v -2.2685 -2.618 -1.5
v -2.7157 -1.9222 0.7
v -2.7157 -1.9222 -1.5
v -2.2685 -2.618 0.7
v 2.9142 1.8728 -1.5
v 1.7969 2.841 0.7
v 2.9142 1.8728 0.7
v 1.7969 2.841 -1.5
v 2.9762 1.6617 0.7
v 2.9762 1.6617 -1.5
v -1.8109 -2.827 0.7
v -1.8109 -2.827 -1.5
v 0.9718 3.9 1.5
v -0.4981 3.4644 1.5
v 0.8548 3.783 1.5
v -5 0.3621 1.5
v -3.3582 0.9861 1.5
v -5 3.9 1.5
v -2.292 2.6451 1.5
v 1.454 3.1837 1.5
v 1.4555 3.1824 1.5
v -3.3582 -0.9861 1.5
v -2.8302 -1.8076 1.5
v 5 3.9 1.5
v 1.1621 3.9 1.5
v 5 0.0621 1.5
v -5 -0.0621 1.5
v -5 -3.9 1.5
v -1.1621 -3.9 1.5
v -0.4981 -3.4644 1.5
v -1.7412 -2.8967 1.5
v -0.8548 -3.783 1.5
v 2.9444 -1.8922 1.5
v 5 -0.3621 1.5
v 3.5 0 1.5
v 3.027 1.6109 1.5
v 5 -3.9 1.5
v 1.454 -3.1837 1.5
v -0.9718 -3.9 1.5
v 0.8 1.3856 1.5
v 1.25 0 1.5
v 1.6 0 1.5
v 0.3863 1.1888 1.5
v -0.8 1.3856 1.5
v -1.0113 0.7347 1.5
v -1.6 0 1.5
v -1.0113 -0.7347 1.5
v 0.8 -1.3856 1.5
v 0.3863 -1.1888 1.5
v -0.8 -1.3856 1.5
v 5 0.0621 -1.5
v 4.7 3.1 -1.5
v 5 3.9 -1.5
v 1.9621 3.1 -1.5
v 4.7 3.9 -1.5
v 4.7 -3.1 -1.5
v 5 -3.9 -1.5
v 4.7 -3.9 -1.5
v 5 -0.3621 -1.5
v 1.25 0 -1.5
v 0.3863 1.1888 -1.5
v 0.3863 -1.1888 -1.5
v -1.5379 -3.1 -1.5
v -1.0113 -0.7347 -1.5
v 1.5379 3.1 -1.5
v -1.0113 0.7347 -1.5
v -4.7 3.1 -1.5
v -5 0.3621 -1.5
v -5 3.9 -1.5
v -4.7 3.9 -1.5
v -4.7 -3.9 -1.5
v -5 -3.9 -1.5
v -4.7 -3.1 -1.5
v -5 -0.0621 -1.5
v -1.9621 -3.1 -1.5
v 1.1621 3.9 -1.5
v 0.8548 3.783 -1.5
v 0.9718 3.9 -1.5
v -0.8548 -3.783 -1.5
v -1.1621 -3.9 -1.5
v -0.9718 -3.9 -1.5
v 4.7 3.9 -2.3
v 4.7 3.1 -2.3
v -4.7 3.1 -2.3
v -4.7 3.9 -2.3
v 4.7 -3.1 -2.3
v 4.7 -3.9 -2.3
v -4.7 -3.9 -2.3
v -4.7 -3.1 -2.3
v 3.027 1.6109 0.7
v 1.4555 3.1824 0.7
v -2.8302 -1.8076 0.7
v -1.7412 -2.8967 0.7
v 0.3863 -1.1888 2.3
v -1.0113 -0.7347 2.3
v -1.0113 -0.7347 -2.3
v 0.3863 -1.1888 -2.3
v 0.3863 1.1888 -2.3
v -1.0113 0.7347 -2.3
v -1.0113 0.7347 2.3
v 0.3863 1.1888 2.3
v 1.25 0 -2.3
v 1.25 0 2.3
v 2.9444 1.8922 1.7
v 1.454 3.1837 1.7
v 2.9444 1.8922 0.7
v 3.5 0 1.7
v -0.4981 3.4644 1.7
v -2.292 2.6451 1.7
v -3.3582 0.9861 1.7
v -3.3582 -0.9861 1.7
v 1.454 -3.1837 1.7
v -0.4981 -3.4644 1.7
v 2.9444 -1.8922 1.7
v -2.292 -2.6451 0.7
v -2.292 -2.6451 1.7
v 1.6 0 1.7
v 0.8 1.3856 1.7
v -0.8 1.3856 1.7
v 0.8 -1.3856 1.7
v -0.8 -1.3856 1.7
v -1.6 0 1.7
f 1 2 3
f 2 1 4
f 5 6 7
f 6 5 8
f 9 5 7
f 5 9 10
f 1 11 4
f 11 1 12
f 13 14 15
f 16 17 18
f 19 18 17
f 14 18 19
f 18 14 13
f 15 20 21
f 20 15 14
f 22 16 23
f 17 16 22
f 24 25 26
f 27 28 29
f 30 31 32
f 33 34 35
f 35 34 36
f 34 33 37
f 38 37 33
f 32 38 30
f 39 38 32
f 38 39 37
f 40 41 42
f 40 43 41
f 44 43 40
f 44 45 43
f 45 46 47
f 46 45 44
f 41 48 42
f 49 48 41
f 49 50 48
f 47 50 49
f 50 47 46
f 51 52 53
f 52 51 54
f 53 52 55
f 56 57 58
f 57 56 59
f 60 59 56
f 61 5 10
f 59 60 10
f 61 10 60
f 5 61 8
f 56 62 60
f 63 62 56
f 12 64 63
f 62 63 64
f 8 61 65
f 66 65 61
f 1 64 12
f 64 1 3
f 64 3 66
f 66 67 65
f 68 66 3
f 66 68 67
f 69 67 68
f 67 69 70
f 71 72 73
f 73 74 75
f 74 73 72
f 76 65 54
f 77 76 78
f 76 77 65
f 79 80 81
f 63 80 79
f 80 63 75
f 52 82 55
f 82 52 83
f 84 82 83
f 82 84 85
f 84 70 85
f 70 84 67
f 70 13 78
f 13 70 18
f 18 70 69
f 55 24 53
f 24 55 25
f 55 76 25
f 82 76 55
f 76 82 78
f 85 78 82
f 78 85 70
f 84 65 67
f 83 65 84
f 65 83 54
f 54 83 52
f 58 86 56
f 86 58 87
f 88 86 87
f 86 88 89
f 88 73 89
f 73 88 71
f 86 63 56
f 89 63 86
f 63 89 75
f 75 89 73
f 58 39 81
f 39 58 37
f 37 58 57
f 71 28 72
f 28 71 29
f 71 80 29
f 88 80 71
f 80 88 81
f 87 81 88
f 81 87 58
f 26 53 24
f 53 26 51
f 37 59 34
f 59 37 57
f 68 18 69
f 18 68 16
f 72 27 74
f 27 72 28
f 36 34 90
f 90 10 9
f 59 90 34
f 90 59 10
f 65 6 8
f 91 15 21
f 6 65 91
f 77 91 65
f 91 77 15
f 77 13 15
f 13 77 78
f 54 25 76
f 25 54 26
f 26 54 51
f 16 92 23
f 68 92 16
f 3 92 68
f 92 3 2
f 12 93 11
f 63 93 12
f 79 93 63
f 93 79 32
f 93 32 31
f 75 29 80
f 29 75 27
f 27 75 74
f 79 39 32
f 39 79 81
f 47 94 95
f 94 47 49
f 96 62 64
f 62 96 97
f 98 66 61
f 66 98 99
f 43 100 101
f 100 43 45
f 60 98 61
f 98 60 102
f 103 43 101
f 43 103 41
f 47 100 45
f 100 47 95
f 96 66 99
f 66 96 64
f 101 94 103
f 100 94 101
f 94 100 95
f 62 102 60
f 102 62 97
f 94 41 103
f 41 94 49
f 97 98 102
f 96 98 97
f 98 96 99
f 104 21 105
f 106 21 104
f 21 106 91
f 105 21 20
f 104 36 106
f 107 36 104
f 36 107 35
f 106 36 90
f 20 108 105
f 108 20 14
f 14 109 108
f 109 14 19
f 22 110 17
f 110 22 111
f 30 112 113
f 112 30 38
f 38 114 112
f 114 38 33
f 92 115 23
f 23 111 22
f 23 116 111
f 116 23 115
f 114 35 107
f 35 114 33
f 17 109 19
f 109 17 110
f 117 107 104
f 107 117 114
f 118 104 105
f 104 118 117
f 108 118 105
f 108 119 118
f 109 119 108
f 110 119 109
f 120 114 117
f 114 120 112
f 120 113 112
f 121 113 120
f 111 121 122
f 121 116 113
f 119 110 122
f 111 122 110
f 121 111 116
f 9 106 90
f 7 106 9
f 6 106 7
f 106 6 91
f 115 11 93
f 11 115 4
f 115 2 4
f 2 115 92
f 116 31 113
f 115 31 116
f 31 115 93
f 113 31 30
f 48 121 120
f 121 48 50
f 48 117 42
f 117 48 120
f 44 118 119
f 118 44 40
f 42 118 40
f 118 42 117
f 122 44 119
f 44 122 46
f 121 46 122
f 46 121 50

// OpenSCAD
// Parameters
thread_diameter = 3.0; //[1.5:6.0:0.1]
thread_pitch = 0.5; //[0.25:1.0:0.05]
across_flats = 6.0; //[3.0:12.0:0.1]
thickness = 3.0; //[1.5:6.0:0.1]
hole_tap_drill_diameter = 2.5; //[1.2:5.0:0.05]
chamfer = 0.3; //[0.1:1.0:0.05]
edge_fillet_radius = 0.2; //[0.0:1.0:0.05]
t_slot_nominal_width = 8.0; //[4.0:16.0:0.1]
t_slot_neck_width = 6.0; //[3.0:12.0:0.1]
t_slot_depth = 6.0; //[3.0:12.0:0.1]
nut_overall_length = 10.0; //[5.0:20.0:0.1]
nut_overall_width = 7.8; //[4.0:16.0:0.1]
retention_feature_height = 0.8; //[0.3:2.0:0.05]
retention_feature_width = 0.8; //[0.3:2.0:0.05]
clearance_to_slot = 0.1; //[0.0:0.5:0.05]
overlap = 0.8; //[0.5:2.0:0.1]
washer_outer_diameter = 7.0; //[4.0:14.0:0.1]
washer_thickness = 1.0; //[0.5:2.5:0.1]
washer_hole_diameter = 3.2; //[2.0:6.5:0.1]

// Nut and Washer - complete geometry
module nut_and_washer() {
  color("DimGray") {
    // Nut Body
    intersection() {
      translate([0, 0, 0])
        cylinder(r=across_flats/(2*cos(30)), h=thickness, center=true);
      translate([0, 0, 0])
        cube([nut_overall_length, nut_overall_width, thickness], center=true);
    }
    
    // Retention Ears
    union() {
      translate([0, nut_overall_width/2 + retention_feature_width/2 - overlap, -thickness/2 + retention_feature_height/2 - overlap])
        cube([nut_overall_length - 2*chamfer, retention_feature_width, retention_feature_height], center=true);
      translate([0, -nut_overall_width/2 - retention_feature_width/2 + overlap, -thickness/2 + retention_feature_height/2 - overlap])
        cube([nut_overall_length - 2*chamfer, retention_feature_width, retention_feature_height], center=true);
    }
    
    // Lead-in Chamfers
    difference() {
      translate([0, 0, 0])
        cube([nut_overall_length, nut_overall_width, thickness], center=true);
      translate([nut_overall_length/2 - chamfer/2, 0, 0])
        rotate([0, 0, 45])
        cube([chamfer, nut_overall_width + 2*retention_feature_width + 2*overlap, thickness + 2*overlap], center=true);
      translate([-nut_overall_length/2 + chamfer/2, 0, 0])
        rotate([0, 0, 45])
        cube([chamfer, nut_overall_width + 2*retention_feature_width + 2*overlap, thickness + 2*overlap], center=true);
    }
    
    // Threaded Hole
    translate([0, 0, 0])
      cylinder(r=hole_tap_drill_diameter/2, h=thickness + 2*overlap, center=true);
  }
  
  // Washer
  color("Silver") {
    difference() {
      translate([0, 0, thickness/2 + washer_thickness/2 - overlap])
        cylinder(r=washer_outer_diameter/2, h=washer_thickness, center=true);
      translate([0, 0, thickness/2 + washer_thickness/2 - overlap])
        cylinder(r=washer_hole_diameter/2, h=washer_thickness + 2*overlap, center=true);
    }
  }
}

// Assembly
module assembly() {
  nut_and_washer();
}

assembly();
